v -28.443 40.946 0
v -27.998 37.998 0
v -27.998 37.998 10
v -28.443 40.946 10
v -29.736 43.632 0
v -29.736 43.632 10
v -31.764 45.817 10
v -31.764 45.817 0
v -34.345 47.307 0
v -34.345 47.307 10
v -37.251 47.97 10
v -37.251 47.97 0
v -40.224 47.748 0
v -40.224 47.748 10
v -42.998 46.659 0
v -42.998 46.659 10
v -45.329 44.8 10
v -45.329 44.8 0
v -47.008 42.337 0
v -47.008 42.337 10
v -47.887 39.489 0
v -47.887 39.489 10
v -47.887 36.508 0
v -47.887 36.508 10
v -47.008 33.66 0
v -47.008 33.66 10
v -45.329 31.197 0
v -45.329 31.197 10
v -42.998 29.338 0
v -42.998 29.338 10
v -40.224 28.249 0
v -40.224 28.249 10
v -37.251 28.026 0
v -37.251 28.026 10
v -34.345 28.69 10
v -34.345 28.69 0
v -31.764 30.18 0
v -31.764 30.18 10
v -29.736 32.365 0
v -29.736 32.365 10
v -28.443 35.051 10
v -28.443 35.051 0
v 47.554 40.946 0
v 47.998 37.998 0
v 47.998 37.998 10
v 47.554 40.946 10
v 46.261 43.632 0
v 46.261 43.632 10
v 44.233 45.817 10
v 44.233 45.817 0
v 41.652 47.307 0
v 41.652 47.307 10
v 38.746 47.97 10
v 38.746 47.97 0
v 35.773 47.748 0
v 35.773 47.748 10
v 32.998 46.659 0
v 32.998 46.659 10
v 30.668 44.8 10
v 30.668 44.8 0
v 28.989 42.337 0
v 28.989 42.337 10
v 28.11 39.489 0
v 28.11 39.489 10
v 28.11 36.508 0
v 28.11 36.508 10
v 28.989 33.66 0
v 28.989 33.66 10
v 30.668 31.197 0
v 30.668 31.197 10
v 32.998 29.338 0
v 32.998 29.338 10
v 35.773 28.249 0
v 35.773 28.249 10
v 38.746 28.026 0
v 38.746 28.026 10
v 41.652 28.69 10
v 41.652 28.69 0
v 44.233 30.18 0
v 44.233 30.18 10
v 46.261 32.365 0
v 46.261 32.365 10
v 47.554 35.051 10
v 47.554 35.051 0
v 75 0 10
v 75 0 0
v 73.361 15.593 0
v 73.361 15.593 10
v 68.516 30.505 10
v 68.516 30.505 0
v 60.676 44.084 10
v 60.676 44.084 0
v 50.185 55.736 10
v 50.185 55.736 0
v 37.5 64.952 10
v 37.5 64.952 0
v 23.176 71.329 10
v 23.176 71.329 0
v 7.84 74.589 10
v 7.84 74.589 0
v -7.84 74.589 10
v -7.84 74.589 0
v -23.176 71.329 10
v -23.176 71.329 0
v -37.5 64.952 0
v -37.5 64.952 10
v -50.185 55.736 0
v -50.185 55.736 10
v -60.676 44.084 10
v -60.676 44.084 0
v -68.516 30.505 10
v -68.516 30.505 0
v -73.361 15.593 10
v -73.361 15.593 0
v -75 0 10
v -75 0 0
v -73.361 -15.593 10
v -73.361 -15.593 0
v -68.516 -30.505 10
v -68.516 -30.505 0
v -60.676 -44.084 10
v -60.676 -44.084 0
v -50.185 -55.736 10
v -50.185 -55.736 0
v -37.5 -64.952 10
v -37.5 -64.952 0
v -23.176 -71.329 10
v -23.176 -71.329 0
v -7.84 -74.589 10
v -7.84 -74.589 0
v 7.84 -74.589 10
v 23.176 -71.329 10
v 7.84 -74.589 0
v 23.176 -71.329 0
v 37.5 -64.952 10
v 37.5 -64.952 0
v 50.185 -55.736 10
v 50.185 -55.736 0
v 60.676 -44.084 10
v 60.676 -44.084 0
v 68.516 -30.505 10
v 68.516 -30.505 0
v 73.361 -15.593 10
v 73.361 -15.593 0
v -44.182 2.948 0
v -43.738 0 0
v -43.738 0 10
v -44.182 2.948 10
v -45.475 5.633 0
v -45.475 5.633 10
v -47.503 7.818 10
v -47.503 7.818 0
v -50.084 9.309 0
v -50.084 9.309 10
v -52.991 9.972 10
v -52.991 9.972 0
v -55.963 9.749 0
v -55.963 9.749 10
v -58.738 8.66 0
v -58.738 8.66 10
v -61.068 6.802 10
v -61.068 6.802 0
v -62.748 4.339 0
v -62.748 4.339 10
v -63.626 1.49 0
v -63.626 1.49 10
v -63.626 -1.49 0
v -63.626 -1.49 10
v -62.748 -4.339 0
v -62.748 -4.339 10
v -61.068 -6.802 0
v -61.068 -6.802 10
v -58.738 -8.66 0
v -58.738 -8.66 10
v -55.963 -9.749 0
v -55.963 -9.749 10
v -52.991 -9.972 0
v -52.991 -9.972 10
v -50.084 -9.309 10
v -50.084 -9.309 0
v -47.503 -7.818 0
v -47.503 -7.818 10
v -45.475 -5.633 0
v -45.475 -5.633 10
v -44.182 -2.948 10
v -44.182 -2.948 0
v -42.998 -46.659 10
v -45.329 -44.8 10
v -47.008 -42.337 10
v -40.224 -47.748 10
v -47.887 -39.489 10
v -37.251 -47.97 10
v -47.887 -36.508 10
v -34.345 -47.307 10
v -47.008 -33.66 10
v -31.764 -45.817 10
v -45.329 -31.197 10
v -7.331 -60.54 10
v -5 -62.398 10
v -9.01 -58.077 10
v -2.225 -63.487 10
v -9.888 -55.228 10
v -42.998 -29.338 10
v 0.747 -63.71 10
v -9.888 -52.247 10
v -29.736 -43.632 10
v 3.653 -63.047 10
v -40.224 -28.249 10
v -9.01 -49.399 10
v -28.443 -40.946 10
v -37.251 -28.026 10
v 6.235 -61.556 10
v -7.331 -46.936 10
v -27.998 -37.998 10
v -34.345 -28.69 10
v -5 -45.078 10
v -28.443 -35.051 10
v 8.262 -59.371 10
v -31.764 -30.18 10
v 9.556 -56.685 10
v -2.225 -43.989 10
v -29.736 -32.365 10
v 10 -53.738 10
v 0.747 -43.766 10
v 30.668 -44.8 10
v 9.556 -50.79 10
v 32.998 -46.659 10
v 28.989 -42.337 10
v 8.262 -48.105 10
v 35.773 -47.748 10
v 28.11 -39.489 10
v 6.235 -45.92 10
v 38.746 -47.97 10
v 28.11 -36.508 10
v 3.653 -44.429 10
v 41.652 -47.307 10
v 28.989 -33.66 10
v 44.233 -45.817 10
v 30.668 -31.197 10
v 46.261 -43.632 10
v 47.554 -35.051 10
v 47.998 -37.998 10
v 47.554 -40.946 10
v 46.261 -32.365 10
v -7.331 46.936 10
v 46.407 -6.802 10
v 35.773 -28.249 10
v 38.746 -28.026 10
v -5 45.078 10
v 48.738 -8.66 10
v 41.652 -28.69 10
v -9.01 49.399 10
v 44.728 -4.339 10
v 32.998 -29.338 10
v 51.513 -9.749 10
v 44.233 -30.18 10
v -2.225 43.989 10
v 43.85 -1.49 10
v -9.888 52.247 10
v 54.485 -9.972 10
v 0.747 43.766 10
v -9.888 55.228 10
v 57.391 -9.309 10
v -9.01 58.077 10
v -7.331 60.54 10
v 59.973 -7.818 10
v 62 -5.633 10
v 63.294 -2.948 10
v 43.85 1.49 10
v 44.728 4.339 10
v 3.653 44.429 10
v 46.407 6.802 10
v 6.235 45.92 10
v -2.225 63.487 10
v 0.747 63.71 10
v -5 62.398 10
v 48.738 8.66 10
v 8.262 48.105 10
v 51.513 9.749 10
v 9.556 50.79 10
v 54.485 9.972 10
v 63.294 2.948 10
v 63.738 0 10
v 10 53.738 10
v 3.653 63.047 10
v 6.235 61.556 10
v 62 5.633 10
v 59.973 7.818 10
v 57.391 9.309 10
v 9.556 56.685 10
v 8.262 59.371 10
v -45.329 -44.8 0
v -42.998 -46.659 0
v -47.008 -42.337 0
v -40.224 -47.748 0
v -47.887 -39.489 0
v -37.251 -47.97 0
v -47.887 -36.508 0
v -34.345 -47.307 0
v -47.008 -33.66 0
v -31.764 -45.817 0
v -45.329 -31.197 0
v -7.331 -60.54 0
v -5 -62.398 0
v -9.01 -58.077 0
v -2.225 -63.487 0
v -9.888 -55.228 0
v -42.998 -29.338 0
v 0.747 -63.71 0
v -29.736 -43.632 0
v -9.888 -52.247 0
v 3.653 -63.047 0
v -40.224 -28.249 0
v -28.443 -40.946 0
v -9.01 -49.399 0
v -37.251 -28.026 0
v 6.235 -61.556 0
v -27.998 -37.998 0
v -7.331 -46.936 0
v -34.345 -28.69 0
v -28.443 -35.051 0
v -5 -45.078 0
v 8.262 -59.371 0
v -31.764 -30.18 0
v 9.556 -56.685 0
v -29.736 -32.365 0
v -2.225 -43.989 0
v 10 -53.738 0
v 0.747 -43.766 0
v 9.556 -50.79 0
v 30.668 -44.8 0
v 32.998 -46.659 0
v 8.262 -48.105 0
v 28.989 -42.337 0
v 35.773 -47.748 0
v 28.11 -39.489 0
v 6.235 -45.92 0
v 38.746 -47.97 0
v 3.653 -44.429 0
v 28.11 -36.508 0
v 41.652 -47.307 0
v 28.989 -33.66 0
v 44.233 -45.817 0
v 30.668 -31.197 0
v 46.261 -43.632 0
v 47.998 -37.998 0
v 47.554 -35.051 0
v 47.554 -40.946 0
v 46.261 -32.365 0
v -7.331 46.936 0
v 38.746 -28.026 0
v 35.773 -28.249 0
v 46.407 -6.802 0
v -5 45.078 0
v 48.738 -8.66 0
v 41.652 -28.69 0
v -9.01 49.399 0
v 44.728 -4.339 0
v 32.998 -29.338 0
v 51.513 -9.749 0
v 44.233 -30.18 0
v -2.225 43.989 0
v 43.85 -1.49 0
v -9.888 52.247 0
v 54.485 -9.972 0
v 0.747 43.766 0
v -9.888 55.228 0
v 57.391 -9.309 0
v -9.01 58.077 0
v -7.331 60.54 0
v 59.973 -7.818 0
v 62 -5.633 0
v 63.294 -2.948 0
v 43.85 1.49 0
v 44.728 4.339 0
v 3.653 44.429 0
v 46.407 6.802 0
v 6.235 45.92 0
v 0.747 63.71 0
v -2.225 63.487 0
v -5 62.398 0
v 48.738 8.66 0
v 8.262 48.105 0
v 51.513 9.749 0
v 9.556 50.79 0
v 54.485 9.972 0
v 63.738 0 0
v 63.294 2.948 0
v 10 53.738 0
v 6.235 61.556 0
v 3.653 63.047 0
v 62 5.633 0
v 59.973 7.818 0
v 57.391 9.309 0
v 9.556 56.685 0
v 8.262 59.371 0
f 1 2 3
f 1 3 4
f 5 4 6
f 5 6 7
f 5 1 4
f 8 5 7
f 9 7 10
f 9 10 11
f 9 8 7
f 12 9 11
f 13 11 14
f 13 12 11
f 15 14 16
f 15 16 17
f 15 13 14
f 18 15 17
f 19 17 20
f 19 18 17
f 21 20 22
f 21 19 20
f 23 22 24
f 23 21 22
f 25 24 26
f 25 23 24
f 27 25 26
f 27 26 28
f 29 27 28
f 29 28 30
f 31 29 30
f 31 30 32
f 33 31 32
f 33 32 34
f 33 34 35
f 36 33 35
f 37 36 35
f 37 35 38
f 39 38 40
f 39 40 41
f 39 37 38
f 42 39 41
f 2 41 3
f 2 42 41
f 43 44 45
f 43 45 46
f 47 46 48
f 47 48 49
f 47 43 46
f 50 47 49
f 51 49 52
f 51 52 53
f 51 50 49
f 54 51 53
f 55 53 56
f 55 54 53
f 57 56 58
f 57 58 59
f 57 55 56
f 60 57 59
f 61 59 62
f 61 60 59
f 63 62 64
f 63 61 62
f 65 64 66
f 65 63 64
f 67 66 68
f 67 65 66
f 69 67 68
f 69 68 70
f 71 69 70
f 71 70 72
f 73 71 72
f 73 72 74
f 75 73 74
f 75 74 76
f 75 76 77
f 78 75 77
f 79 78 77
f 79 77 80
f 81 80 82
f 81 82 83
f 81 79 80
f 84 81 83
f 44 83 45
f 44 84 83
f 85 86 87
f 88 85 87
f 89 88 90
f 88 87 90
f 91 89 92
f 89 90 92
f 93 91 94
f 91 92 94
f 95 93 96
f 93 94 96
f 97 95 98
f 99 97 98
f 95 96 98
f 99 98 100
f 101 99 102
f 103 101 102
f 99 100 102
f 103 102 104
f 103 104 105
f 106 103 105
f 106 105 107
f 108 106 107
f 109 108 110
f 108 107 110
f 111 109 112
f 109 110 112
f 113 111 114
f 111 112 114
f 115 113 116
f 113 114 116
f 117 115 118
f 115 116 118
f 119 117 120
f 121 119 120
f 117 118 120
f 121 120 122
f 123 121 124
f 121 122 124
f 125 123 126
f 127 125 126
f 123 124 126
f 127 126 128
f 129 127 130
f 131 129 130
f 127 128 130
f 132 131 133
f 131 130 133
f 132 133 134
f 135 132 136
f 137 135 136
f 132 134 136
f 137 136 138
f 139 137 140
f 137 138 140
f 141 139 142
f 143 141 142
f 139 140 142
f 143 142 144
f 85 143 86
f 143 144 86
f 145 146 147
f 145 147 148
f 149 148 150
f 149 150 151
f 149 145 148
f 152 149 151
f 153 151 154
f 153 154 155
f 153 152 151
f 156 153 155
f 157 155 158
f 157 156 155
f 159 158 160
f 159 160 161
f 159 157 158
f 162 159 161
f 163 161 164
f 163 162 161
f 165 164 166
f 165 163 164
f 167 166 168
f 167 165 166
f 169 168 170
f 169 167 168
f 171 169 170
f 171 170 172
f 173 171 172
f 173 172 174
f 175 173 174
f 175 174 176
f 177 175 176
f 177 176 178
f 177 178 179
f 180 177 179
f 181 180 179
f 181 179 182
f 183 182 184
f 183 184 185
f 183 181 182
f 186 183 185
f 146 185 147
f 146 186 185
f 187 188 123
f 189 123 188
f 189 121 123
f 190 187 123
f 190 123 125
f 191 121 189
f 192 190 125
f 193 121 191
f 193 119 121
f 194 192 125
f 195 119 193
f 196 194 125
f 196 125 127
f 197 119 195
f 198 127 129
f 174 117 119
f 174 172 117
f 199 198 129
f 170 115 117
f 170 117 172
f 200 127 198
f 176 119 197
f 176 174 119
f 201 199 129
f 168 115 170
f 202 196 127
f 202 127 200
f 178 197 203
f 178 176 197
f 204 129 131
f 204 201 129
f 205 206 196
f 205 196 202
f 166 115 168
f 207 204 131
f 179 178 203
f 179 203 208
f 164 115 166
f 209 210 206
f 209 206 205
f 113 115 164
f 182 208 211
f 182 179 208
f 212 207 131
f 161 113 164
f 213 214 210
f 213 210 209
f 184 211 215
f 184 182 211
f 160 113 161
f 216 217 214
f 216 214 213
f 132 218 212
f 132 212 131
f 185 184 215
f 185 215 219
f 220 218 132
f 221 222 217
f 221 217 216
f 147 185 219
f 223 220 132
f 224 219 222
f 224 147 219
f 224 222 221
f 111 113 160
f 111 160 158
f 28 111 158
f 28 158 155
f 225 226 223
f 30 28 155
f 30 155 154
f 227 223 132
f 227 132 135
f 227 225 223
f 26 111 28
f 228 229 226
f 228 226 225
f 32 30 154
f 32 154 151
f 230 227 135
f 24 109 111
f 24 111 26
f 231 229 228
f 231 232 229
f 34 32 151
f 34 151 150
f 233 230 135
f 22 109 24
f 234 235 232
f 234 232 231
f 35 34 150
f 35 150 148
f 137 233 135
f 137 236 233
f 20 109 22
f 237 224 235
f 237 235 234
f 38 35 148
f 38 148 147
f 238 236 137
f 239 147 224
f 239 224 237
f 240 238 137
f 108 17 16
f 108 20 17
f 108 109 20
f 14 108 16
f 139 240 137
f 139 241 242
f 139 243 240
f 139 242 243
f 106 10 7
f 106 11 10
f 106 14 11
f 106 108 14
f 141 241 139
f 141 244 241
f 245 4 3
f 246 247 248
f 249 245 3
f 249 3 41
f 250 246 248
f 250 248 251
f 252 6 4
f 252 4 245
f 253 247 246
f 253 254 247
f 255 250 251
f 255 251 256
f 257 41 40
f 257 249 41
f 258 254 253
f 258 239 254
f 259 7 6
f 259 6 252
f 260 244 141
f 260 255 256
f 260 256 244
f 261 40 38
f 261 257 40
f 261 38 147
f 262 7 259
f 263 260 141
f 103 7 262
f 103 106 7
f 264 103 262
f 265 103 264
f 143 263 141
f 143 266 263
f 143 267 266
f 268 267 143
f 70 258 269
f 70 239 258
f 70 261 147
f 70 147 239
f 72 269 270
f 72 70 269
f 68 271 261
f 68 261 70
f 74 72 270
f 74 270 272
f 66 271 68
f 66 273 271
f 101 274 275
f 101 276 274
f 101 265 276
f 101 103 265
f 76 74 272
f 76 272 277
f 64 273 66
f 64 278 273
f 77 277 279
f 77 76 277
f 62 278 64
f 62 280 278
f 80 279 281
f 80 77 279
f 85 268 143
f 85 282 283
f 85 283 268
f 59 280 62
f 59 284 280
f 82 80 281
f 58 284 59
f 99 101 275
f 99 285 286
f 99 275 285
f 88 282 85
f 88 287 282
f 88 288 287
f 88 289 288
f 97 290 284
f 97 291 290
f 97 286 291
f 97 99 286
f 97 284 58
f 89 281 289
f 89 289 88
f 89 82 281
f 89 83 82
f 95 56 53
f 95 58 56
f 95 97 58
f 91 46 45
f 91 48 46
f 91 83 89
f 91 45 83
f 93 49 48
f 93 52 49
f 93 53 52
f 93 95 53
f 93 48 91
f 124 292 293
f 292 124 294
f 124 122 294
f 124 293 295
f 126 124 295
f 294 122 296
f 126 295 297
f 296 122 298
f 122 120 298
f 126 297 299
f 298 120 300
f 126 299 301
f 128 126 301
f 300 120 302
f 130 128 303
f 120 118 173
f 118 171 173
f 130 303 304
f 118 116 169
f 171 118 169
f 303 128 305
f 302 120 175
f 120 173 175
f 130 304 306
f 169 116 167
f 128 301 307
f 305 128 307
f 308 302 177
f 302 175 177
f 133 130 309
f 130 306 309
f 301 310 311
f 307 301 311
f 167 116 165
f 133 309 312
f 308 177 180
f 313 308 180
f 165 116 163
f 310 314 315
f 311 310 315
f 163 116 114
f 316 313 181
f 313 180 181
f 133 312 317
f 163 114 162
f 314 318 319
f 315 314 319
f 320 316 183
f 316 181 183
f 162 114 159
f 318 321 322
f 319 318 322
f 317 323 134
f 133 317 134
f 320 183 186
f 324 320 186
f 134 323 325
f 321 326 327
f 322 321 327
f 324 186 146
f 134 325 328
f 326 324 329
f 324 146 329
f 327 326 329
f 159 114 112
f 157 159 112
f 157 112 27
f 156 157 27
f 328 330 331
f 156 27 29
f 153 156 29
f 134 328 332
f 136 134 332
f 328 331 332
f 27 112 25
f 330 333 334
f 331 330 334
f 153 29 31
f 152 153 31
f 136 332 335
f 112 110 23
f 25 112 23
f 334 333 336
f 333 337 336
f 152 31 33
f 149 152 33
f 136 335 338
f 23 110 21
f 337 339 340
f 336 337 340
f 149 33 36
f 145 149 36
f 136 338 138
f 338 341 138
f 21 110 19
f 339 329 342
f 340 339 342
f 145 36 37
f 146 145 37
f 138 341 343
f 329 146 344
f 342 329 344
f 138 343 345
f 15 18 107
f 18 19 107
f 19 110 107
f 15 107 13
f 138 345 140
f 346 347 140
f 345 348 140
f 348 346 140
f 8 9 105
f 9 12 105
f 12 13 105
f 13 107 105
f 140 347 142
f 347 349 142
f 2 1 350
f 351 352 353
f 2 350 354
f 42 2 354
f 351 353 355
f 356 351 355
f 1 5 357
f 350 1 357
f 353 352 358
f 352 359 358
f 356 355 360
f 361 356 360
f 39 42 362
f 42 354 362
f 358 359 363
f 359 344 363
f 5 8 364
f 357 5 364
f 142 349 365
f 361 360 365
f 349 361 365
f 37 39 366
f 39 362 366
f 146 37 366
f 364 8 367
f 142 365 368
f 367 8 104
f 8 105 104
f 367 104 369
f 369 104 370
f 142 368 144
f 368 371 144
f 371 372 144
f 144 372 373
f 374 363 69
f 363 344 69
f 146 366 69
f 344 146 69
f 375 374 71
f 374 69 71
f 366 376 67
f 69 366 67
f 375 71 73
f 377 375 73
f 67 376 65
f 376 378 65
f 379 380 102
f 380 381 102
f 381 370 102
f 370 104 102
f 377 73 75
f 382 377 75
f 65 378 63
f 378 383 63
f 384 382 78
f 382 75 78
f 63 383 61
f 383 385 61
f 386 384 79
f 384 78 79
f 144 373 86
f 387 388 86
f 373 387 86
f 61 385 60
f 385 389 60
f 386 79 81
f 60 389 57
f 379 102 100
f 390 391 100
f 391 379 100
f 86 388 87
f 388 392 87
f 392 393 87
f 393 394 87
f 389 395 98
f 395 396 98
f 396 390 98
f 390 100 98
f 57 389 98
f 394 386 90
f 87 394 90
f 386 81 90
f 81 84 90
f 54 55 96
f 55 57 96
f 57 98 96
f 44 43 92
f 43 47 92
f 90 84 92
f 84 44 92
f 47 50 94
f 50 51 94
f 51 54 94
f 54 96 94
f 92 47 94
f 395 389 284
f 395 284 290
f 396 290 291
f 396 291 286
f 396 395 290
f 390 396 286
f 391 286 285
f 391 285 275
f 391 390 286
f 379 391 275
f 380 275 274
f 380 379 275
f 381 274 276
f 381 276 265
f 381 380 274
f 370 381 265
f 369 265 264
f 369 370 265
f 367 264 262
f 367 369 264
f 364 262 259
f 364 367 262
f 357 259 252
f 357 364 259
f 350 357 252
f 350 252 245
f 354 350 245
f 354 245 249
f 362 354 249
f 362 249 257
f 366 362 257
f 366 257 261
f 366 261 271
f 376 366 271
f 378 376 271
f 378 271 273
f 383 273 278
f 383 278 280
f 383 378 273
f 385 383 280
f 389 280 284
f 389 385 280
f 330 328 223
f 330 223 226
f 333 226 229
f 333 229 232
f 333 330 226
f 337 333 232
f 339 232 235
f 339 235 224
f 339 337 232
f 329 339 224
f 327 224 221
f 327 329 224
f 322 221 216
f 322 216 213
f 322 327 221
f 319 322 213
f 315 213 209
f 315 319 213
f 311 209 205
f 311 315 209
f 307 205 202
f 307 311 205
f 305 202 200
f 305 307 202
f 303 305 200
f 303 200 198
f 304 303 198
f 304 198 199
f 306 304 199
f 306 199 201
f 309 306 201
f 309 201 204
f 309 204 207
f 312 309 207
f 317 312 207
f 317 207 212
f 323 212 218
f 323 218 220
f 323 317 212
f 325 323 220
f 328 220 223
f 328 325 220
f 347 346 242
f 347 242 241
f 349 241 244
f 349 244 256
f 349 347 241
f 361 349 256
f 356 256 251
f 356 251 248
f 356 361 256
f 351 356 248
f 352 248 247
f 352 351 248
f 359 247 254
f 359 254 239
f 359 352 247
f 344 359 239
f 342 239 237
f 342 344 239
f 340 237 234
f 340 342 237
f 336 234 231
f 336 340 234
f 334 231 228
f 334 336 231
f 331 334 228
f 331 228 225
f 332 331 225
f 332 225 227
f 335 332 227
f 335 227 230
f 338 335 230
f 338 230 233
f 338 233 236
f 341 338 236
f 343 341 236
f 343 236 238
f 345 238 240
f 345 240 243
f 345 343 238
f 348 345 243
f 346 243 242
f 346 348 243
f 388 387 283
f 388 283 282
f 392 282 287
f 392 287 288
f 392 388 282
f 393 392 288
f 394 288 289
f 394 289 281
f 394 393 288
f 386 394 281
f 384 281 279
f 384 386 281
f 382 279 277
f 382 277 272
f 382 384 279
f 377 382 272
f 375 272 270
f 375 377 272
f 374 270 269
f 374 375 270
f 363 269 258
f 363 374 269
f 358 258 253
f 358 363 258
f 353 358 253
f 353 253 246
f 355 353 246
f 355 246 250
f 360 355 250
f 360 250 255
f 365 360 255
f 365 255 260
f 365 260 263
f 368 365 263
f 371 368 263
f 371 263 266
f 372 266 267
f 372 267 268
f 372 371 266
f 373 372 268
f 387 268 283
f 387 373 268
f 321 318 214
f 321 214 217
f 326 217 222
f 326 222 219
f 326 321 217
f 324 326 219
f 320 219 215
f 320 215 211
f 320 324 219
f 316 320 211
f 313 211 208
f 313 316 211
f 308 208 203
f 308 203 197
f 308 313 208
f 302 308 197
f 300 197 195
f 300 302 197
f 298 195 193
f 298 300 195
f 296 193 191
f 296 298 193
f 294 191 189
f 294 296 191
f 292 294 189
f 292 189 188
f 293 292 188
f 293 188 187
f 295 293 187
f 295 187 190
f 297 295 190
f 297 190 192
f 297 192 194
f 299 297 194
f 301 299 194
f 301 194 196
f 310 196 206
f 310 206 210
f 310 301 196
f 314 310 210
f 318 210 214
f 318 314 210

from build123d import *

# Parameters (mm, degrees)
SKETCH1_R           = 75
SKETCH1_R_2         = 10
BOSS_EXTRUDE1_DEPTH = 10


with BuildPart() as part:
    # Sketch1 → Boss-Extrude1 (new body)
    with BuildSketch(Plane.XY):
        Circle(SKETCH1_R)
        with Locations((0, 53.737864078)):
            Circle(SKETCH1_R_2, mode=Mode.SUBTRACT)
        with Locations((37.998408096, 37.998408096)):
            Circle(SKETCH1_R_2, mode=Mode.SUBTRACT)
        with Locations((53.737864078, 0)):
            Circle(SKETCH1_R_2, mode=Mode.SUBTRACT)
        with Locations((37.998408096, -37.998408096)):
            Circle(SKETCH1_R_2, mode=Mode.SUBTRACT)
        with Locations((0, -53.737864078)):
            Circle(SKETCH1_R_2, mode=Mode.SUBTRACT)
        with Locations((-37.998408096, -37.998408096)):
            Circle(SKETCH1_R_2, mode=Mode.SUBTRACT)
        with Locations((-53.737864078, 0)):
            Circle(SKETCH1_R_2, mode=Mode.SUBTRACT)
        with Locations((-37.998408096, 37.998408096)):
            Circle(SKETCH1_R_2, mode=Mode.SUBTRACT)
    extrude(amount=BOSS_EXTRUDE1_DEPTH)


solid = part.part
